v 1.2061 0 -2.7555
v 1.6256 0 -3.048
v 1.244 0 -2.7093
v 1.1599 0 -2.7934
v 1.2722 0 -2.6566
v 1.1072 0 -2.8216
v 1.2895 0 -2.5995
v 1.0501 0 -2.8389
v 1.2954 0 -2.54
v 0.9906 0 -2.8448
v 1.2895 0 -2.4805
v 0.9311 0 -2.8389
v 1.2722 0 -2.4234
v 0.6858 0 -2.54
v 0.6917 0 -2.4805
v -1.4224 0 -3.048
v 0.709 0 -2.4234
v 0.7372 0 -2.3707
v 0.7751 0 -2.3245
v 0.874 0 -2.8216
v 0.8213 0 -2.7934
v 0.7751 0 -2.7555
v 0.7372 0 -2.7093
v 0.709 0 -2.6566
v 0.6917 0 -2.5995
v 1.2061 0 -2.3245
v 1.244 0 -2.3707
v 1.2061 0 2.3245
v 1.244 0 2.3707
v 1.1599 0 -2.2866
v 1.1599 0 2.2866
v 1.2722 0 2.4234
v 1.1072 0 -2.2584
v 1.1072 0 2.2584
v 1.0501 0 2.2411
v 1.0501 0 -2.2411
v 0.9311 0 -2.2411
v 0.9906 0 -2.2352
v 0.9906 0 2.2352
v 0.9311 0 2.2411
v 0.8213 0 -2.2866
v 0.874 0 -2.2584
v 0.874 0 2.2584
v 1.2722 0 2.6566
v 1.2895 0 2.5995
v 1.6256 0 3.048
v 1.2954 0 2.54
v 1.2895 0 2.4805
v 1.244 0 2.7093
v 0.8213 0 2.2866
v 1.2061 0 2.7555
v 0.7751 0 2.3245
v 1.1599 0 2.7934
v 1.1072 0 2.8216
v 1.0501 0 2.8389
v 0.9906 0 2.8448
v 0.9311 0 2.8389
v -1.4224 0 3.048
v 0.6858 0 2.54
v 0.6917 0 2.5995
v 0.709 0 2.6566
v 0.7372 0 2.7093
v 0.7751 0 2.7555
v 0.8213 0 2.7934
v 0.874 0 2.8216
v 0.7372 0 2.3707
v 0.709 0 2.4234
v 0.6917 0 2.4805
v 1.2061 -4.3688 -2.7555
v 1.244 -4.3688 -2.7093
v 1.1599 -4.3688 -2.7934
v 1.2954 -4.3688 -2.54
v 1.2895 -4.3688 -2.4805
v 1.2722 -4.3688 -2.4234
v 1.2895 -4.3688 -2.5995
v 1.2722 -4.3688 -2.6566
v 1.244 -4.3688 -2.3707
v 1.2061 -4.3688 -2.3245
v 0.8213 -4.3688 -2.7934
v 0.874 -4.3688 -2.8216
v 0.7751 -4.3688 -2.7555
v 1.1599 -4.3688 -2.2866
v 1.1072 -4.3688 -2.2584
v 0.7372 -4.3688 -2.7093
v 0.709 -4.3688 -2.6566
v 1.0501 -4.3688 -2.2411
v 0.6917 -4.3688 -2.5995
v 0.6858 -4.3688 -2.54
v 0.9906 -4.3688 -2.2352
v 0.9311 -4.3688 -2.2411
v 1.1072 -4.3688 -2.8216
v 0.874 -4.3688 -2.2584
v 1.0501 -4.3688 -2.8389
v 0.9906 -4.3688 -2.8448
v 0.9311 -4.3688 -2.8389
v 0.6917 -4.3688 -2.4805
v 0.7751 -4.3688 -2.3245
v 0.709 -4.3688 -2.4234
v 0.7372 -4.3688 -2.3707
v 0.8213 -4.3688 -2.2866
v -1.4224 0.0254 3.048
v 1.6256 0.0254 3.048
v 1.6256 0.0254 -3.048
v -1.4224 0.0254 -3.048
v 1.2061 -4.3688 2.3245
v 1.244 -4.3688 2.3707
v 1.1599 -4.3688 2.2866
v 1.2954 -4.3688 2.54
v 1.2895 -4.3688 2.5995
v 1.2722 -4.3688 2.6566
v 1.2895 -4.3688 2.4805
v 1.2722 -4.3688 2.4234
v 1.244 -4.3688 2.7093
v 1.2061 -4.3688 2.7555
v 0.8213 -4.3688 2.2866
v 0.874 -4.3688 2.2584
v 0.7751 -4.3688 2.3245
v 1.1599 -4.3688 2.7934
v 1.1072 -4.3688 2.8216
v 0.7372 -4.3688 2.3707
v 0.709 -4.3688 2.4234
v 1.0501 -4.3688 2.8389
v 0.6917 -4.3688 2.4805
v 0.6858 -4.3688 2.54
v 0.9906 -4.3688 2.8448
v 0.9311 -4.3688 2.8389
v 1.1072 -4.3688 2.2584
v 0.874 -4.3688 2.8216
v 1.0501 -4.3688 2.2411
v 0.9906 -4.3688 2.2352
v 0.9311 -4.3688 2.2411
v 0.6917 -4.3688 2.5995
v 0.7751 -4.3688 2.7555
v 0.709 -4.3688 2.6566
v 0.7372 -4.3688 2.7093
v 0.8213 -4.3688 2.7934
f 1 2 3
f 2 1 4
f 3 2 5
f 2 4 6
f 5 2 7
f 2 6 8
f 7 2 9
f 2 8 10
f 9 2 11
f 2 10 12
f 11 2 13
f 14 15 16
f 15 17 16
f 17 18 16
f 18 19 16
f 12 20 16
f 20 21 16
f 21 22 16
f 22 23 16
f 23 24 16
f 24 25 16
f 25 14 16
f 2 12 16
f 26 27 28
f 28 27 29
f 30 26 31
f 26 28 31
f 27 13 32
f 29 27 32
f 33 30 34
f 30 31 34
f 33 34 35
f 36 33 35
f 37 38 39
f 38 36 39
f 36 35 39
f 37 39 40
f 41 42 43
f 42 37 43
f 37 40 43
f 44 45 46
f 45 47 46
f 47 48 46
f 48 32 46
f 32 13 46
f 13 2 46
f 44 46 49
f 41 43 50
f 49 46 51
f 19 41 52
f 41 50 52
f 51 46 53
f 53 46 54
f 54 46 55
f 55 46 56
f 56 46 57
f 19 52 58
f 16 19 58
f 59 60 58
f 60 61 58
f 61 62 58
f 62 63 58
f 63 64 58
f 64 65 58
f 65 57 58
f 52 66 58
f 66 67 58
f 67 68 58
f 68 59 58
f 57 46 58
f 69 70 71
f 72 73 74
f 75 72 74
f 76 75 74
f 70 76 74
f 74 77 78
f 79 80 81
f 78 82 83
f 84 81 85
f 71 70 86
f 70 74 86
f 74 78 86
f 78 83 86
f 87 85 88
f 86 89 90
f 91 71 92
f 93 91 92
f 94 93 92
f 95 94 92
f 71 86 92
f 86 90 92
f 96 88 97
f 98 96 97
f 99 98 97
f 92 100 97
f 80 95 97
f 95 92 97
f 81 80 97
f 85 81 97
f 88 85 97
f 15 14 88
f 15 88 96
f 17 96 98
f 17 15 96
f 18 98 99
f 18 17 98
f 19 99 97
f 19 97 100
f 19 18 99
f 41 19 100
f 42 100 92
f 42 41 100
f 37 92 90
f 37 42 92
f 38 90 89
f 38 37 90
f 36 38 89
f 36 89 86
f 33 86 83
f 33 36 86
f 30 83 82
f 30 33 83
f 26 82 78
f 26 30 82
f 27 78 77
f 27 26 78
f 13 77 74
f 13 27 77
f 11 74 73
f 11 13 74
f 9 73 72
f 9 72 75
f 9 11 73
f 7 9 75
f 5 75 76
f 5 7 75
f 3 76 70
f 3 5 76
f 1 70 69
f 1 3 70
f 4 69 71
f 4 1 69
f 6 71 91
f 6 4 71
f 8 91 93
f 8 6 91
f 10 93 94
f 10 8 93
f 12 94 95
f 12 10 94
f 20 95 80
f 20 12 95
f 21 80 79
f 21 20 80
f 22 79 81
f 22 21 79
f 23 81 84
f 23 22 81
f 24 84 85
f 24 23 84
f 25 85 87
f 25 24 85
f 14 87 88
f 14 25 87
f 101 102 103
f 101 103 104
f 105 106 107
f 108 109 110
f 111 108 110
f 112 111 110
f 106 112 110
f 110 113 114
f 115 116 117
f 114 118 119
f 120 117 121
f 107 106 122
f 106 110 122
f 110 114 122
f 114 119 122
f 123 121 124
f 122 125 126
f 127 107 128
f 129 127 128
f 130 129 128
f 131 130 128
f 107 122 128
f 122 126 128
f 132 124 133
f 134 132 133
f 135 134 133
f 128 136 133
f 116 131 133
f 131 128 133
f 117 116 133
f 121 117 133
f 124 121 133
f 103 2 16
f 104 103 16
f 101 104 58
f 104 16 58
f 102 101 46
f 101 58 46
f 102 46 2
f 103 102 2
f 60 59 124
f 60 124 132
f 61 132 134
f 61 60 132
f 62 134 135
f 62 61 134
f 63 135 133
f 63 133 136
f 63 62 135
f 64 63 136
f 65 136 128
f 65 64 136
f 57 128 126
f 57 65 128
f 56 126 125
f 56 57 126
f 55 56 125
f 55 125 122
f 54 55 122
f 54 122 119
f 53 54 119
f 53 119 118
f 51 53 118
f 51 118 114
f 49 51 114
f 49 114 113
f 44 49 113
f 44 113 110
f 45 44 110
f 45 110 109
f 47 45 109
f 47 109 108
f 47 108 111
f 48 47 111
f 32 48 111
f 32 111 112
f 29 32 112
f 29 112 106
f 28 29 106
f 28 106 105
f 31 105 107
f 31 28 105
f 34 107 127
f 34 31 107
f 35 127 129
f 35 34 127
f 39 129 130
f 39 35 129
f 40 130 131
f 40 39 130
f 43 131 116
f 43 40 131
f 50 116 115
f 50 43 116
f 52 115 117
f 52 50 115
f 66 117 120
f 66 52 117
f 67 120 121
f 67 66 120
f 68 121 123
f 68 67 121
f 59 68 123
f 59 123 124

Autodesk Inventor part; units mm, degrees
sketch "Sketch_1" plane through (0, 0, 0) normal (0, 1, 0) x (-1, 0, 0)
  line L0 (1.4224, 3.048) -> (-1.6256, 3.048)
  line L1 (-1.6256, 3.048) -> (-1.6256, -3.048)
  line L2 (-1.6256, -3.048) -> (1.4224, -3.048)
  line L3 (1.4224, -3.048) -> (1.4224, 3.048)
extrude "Extrusion1" add sketch "Sketch_1" along normal blind 0.0254
sketch "Sketch_2" plane through (0, 0, 0) normal (0, 1, 0) x (-1, 0, 0)
  circle A0 centre (-0.9906, -2.54) radius 0.3048
extrude "Extrusion2" add sketch "Sketch_2" against normal blind 4.3688
pattern_linear "Rectangular Pattern1" count 2 spacing 5.08 along (0, 0, 1) of "Extrusion2"
ref_plane "to_body_XY" through (0, 0, 0) normal (0, -1, 0) x (1, 0, 0)
ref_plane "to_body_YZ" through (0, 0, 0) normal (1, 0, 0) x (0, 0, 1)
ref_plane "to_body_ZX" through (0, 0, 0) normal (0, 0, 1) x (0, -1, 0)
ref_plane "to_body1_XY" through (0, -0.1016, 0.0254) normal (0, -1, 0) x (1, 0, 0)
ref_plane "to_body1_YZ" through (0, -0.1016, 0.0254) normal (1, 0, 0) x (0, 0, 1)
ref_plane "to_body1_ZX" through (0, -0.1016, 0.0254) normal (0, 0, 1) x (0, -1, 0)
properties part number "A11P-toggle-terminals"
